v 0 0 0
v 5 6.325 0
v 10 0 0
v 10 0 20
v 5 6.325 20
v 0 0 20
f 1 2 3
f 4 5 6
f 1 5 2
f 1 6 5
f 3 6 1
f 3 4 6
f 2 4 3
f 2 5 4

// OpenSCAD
//polygon([ [0,0], [10,0], [5,7] ]);


//linear_extrude(height=5)
//polygon([ [0,0], [9,0], [11,6], [-2,3], [-5,-11] ]);


module triangular_prism(x1,y1, x2,y2, x3,y3, h) {
    linear_extrude(height=h)
      polygon( [ [x1,y1], [x2,y2], [x3,y3] ]);
}

//triangular_prism(0,0, 10,0, 5,7, 20);

module equilateral_prism(s, h) {
    triangular_prism(0,0, s,0, s/2, 2*sqrt(s), h);
}

equilateral_prism(10, 20);
